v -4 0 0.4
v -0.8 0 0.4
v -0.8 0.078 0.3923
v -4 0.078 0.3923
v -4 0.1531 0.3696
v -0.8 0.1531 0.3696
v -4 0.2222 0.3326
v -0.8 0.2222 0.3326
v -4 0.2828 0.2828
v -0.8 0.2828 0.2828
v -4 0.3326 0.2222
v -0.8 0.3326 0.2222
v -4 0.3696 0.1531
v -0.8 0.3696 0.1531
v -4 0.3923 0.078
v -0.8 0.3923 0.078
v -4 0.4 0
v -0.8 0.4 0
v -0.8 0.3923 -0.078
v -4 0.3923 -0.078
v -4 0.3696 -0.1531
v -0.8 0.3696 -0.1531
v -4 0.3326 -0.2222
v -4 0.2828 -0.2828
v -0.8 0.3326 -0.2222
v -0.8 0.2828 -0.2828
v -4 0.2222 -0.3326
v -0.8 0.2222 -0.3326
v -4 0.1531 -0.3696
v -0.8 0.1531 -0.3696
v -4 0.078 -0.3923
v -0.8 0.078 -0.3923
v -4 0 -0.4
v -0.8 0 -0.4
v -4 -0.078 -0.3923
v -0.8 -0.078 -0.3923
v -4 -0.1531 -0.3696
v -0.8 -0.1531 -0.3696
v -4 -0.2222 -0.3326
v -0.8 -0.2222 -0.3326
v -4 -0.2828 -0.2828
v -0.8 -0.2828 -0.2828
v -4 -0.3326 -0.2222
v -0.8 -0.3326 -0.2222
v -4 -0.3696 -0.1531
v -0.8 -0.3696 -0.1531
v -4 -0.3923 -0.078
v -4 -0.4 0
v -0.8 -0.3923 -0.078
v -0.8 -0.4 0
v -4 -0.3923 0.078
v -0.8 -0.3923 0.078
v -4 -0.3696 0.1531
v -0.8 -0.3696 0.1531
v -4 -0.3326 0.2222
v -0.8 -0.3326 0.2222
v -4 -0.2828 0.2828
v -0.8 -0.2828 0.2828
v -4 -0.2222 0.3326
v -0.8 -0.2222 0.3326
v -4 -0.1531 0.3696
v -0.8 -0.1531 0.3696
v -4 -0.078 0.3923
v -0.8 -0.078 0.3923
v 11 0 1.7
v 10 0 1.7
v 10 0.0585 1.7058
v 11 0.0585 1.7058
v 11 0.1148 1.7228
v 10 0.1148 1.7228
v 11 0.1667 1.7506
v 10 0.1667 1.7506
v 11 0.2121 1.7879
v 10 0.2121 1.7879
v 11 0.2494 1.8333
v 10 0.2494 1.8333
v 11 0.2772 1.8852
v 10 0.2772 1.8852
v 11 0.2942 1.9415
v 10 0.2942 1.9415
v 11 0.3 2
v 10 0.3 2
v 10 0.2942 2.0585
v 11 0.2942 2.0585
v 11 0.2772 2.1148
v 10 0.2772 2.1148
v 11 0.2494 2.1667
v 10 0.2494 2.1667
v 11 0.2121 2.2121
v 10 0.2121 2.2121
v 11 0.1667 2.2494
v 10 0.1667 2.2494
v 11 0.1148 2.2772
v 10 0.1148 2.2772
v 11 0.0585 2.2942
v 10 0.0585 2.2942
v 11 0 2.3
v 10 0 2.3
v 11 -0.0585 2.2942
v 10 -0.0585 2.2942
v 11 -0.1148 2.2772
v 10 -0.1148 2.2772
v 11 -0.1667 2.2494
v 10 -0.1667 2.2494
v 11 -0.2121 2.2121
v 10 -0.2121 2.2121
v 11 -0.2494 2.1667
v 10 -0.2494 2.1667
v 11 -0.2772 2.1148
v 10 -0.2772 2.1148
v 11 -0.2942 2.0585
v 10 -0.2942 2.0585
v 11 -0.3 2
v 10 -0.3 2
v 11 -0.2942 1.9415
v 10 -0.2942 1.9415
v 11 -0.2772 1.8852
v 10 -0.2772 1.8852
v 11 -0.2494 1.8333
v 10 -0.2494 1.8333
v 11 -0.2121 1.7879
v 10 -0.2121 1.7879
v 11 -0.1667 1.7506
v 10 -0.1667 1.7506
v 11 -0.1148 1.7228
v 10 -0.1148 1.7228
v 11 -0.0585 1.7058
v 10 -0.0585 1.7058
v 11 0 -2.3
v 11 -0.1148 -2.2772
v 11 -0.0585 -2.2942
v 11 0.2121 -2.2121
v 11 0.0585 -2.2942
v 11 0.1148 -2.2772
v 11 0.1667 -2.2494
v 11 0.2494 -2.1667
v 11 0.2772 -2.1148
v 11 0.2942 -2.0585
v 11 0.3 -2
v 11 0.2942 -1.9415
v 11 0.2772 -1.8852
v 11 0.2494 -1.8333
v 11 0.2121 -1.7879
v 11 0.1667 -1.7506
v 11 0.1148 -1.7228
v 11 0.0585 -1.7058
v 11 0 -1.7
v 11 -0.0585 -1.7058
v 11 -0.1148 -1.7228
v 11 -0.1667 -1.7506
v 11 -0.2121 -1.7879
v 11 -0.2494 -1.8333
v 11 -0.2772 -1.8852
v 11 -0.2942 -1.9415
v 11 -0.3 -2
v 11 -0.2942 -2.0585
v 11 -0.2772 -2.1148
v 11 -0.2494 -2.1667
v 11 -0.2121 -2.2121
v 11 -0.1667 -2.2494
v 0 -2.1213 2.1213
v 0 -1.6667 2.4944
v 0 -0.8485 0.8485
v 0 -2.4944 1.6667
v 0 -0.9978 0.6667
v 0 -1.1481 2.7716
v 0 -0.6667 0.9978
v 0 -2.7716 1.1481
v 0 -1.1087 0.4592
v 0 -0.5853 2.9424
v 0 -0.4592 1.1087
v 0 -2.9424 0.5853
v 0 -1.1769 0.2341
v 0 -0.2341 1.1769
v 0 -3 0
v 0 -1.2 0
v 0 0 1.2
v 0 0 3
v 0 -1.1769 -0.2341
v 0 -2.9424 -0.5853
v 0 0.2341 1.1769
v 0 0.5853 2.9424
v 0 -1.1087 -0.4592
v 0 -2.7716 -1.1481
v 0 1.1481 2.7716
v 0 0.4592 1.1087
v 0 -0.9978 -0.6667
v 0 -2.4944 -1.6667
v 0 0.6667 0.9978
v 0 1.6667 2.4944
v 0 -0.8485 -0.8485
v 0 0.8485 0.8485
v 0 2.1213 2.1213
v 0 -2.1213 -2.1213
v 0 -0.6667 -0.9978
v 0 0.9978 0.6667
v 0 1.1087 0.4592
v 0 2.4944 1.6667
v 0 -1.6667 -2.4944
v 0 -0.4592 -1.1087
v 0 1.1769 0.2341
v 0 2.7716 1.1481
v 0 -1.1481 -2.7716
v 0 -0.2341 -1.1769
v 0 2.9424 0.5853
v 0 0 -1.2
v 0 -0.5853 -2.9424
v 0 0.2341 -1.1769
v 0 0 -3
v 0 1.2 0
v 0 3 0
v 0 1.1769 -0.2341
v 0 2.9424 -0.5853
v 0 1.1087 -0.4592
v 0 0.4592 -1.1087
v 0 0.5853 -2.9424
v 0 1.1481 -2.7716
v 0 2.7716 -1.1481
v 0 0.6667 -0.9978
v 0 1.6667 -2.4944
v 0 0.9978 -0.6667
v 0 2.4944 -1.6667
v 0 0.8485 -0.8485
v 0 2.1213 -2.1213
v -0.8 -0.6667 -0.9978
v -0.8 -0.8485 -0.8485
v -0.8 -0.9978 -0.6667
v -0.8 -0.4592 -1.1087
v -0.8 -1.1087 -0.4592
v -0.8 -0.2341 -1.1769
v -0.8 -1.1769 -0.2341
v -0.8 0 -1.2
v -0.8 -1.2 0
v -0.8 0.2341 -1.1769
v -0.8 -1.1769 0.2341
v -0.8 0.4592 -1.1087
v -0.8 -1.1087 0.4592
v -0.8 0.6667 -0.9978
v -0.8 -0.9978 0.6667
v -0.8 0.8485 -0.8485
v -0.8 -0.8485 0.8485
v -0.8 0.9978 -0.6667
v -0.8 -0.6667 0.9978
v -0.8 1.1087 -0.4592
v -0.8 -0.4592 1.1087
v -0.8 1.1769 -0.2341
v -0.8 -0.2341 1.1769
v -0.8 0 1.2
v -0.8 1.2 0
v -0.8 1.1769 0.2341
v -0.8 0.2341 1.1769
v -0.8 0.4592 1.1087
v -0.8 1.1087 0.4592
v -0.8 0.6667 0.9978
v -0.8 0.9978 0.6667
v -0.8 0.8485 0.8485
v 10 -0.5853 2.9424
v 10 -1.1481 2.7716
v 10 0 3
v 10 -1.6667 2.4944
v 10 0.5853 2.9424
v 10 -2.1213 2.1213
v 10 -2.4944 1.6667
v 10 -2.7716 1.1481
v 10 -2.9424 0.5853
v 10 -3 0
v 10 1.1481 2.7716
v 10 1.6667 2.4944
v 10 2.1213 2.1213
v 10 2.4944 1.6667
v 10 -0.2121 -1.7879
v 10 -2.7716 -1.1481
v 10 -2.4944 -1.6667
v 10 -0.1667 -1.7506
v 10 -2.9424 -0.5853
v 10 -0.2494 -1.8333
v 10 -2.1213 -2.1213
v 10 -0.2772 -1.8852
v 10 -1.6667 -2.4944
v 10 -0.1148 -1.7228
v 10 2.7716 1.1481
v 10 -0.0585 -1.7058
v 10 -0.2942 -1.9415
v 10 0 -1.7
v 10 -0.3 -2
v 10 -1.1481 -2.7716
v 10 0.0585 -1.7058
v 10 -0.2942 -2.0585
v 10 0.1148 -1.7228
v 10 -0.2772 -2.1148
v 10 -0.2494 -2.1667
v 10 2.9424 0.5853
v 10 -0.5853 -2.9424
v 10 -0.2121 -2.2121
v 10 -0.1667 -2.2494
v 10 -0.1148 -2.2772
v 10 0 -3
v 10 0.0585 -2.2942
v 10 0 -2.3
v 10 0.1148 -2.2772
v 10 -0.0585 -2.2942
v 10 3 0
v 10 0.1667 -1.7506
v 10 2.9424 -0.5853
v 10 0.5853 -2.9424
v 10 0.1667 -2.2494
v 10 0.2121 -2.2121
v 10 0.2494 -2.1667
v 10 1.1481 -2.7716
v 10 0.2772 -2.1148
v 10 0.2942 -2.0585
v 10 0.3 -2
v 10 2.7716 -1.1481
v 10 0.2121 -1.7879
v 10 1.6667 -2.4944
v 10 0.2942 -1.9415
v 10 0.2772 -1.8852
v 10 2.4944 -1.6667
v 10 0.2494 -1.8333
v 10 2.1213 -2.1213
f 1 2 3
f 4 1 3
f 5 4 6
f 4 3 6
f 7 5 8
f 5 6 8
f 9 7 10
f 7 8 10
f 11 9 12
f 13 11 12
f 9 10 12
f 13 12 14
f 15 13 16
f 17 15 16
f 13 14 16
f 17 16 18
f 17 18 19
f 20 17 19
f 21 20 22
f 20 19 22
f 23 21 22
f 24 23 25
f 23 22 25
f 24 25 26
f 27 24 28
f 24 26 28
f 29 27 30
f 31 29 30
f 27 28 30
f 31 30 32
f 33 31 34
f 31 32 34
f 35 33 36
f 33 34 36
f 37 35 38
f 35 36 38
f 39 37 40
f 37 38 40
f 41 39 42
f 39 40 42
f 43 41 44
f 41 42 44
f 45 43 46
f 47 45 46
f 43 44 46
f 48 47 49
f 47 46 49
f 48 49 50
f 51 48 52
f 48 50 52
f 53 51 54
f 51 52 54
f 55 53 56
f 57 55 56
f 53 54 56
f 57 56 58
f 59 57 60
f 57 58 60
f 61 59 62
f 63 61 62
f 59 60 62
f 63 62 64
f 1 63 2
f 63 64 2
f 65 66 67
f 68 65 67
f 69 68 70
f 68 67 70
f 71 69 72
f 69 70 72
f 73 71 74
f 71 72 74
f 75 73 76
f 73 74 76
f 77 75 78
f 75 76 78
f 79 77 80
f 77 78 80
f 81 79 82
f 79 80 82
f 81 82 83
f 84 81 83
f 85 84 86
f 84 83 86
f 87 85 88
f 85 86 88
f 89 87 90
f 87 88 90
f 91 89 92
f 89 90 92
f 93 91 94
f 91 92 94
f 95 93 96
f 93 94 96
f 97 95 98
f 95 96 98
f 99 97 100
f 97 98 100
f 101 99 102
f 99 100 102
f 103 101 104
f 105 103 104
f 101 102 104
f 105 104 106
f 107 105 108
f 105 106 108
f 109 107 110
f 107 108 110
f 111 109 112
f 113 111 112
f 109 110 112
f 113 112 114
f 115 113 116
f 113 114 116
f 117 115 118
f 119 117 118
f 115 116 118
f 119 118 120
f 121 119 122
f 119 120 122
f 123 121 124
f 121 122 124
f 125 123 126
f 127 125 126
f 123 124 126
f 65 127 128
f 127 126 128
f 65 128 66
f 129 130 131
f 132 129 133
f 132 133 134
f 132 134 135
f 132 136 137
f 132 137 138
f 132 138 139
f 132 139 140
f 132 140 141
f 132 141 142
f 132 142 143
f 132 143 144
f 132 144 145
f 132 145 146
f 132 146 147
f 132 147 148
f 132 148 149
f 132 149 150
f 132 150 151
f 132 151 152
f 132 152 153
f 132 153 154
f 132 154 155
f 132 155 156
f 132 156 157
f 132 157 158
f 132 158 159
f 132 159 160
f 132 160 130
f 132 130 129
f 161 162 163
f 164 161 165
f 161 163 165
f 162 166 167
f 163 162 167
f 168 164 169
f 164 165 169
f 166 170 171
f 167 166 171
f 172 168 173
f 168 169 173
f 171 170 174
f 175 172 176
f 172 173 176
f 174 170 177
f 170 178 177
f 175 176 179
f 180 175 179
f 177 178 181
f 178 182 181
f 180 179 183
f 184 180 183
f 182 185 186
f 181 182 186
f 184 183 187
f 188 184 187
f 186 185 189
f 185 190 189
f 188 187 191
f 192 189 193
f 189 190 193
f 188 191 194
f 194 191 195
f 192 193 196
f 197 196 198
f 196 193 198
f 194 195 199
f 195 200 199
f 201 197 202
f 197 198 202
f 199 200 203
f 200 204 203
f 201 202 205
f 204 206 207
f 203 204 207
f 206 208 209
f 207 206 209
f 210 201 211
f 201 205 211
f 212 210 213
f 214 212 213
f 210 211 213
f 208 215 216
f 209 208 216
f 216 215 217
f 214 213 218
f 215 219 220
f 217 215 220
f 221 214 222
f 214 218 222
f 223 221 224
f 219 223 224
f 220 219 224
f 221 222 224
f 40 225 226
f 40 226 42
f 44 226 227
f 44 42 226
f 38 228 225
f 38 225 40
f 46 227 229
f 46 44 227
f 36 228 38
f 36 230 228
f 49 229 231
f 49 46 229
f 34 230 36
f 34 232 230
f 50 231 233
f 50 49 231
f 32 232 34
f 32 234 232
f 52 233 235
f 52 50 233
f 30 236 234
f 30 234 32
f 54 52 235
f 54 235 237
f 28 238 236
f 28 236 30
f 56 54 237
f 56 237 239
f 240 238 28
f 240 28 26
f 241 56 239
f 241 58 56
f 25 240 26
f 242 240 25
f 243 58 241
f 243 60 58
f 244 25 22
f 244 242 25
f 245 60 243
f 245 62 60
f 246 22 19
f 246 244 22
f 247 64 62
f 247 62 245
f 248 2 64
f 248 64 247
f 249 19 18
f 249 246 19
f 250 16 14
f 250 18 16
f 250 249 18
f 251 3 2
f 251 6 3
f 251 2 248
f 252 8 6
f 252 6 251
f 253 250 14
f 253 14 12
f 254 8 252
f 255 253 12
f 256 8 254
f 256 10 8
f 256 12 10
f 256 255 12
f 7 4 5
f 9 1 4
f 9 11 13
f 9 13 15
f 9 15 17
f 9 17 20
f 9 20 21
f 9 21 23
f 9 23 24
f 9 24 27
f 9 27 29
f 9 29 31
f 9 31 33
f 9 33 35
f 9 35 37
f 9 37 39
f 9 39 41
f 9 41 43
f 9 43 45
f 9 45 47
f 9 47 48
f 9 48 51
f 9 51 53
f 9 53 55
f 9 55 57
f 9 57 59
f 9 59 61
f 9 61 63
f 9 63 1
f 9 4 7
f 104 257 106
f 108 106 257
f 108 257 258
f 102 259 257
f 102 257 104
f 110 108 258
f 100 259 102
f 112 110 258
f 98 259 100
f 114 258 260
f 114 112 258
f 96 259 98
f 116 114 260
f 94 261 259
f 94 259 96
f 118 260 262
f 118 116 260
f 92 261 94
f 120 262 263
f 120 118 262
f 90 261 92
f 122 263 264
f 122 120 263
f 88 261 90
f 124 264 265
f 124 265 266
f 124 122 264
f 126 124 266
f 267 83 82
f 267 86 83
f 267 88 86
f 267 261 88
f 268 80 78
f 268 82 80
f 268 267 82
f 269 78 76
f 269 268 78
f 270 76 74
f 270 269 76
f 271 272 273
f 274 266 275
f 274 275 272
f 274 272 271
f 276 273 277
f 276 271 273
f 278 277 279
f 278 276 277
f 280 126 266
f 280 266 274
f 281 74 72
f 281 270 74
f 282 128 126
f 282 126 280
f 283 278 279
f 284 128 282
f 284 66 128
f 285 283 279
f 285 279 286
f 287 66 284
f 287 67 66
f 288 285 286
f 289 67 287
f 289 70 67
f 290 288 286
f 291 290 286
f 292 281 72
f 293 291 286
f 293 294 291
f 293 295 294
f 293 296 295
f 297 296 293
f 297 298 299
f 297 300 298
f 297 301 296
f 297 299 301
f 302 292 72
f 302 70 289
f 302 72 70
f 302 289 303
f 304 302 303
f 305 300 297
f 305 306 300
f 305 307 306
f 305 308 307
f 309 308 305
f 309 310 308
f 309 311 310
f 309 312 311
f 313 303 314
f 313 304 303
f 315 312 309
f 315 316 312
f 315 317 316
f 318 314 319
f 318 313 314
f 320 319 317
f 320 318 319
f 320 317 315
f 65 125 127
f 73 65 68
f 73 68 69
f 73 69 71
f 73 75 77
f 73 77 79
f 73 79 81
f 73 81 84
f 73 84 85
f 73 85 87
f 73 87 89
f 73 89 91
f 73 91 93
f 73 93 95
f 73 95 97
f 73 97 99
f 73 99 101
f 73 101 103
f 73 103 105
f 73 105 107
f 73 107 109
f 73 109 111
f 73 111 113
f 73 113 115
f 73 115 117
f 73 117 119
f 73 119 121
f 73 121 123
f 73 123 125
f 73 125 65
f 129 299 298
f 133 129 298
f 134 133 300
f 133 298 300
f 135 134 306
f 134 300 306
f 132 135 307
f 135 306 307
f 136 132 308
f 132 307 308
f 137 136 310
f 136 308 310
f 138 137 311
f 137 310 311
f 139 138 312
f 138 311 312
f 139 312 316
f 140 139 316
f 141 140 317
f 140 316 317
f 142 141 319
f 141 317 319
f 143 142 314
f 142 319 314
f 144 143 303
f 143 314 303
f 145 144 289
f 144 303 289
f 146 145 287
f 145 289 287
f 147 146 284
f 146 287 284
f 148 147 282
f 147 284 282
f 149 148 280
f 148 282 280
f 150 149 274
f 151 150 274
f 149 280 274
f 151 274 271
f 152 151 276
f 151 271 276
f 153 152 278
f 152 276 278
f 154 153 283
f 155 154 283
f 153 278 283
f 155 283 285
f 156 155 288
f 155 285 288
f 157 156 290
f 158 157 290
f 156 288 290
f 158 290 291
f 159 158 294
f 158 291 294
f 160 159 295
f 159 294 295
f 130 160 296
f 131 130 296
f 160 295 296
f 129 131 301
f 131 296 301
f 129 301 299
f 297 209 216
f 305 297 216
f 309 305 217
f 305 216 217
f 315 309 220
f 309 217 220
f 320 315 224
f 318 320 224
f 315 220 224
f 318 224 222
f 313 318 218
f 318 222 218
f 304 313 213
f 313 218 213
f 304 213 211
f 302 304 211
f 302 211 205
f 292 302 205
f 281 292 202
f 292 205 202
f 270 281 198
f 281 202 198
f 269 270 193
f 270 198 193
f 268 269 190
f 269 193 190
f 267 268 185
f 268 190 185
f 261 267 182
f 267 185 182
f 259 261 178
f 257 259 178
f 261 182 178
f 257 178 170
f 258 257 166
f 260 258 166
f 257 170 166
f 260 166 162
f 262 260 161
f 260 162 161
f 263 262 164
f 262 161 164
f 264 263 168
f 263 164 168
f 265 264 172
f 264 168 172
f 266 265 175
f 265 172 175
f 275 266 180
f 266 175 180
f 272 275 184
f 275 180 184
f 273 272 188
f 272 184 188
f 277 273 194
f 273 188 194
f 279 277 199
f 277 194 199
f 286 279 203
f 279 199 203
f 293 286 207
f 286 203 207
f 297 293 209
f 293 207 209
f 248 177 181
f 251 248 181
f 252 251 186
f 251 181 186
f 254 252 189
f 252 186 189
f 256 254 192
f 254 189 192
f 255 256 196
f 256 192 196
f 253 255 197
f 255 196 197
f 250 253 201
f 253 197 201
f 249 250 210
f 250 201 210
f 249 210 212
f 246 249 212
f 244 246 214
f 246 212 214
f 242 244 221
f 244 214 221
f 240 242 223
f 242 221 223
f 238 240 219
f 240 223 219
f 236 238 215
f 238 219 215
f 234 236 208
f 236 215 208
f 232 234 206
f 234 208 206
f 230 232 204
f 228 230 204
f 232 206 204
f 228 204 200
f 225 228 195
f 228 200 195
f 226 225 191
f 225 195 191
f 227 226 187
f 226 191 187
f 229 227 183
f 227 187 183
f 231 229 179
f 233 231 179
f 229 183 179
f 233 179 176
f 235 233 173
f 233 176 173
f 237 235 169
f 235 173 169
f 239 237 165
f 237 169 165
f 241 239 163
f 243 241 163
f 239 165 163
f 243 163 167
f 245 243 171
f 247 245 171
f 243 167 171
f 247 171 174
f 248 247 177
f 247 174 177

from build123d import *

# Parameters (mm, degrees)
SKETCH1_R           = 3
BOSS_EXTRUDE1_DEPTH = 10
SKETCH2_R           = 1.2
BOSS_EXTRUDE2_DEPTH = 0.8
SKETCH3_R           = 0.4
BOSS_EXTRUDE3_DEPTH = 3.2
SKETCH4_R           = 0.3
BOSS_EXTRUDE4_DEPTH = 1


with BuildPart() as part:
    # Sketch1 → Boss-Extrude1 (new body)
    with BuildSketch(Plane(origin=(0, 0, 0), x_dir=(0, 0, -1), z_dir=(1, 0, 0))):
        Circle(SKETCH1_R)
    extrude(amount=BOSS_EXTRUDE1_DEPTH)

    # Sketch2 → Boss-Extrude2 (add)
    with BuildSketch(Plane.ZY):
        Circle(SKETCH2_R)
    extrude(amount=BOSS_EXTRUDE2_DEPTH)

    # Sketch3 → Boss-Extrude3 (add)
    with BuildSketch(Plane.ZY.offset(0.8)):
        Circle(SKETCH3_R)
    extrude(amount=BOSS_EXTRUDE3_DEPTH)

    # Sketch4 → Boss-Extrude4 (add)
    with BuildSketch(Plane(origin=(10, 0, 0), x_dir=(0, 0, -1), z_dir=(1, 0, 0))):
        with Locations((-2, 0)):
            Circle(SKETCH4_R)
        with Locations((2, 0)):
            Circle(SKETCH4_R)
    extrude(amount=BOSS_EXTRUDE4_DEPTH)


solid = part.part
